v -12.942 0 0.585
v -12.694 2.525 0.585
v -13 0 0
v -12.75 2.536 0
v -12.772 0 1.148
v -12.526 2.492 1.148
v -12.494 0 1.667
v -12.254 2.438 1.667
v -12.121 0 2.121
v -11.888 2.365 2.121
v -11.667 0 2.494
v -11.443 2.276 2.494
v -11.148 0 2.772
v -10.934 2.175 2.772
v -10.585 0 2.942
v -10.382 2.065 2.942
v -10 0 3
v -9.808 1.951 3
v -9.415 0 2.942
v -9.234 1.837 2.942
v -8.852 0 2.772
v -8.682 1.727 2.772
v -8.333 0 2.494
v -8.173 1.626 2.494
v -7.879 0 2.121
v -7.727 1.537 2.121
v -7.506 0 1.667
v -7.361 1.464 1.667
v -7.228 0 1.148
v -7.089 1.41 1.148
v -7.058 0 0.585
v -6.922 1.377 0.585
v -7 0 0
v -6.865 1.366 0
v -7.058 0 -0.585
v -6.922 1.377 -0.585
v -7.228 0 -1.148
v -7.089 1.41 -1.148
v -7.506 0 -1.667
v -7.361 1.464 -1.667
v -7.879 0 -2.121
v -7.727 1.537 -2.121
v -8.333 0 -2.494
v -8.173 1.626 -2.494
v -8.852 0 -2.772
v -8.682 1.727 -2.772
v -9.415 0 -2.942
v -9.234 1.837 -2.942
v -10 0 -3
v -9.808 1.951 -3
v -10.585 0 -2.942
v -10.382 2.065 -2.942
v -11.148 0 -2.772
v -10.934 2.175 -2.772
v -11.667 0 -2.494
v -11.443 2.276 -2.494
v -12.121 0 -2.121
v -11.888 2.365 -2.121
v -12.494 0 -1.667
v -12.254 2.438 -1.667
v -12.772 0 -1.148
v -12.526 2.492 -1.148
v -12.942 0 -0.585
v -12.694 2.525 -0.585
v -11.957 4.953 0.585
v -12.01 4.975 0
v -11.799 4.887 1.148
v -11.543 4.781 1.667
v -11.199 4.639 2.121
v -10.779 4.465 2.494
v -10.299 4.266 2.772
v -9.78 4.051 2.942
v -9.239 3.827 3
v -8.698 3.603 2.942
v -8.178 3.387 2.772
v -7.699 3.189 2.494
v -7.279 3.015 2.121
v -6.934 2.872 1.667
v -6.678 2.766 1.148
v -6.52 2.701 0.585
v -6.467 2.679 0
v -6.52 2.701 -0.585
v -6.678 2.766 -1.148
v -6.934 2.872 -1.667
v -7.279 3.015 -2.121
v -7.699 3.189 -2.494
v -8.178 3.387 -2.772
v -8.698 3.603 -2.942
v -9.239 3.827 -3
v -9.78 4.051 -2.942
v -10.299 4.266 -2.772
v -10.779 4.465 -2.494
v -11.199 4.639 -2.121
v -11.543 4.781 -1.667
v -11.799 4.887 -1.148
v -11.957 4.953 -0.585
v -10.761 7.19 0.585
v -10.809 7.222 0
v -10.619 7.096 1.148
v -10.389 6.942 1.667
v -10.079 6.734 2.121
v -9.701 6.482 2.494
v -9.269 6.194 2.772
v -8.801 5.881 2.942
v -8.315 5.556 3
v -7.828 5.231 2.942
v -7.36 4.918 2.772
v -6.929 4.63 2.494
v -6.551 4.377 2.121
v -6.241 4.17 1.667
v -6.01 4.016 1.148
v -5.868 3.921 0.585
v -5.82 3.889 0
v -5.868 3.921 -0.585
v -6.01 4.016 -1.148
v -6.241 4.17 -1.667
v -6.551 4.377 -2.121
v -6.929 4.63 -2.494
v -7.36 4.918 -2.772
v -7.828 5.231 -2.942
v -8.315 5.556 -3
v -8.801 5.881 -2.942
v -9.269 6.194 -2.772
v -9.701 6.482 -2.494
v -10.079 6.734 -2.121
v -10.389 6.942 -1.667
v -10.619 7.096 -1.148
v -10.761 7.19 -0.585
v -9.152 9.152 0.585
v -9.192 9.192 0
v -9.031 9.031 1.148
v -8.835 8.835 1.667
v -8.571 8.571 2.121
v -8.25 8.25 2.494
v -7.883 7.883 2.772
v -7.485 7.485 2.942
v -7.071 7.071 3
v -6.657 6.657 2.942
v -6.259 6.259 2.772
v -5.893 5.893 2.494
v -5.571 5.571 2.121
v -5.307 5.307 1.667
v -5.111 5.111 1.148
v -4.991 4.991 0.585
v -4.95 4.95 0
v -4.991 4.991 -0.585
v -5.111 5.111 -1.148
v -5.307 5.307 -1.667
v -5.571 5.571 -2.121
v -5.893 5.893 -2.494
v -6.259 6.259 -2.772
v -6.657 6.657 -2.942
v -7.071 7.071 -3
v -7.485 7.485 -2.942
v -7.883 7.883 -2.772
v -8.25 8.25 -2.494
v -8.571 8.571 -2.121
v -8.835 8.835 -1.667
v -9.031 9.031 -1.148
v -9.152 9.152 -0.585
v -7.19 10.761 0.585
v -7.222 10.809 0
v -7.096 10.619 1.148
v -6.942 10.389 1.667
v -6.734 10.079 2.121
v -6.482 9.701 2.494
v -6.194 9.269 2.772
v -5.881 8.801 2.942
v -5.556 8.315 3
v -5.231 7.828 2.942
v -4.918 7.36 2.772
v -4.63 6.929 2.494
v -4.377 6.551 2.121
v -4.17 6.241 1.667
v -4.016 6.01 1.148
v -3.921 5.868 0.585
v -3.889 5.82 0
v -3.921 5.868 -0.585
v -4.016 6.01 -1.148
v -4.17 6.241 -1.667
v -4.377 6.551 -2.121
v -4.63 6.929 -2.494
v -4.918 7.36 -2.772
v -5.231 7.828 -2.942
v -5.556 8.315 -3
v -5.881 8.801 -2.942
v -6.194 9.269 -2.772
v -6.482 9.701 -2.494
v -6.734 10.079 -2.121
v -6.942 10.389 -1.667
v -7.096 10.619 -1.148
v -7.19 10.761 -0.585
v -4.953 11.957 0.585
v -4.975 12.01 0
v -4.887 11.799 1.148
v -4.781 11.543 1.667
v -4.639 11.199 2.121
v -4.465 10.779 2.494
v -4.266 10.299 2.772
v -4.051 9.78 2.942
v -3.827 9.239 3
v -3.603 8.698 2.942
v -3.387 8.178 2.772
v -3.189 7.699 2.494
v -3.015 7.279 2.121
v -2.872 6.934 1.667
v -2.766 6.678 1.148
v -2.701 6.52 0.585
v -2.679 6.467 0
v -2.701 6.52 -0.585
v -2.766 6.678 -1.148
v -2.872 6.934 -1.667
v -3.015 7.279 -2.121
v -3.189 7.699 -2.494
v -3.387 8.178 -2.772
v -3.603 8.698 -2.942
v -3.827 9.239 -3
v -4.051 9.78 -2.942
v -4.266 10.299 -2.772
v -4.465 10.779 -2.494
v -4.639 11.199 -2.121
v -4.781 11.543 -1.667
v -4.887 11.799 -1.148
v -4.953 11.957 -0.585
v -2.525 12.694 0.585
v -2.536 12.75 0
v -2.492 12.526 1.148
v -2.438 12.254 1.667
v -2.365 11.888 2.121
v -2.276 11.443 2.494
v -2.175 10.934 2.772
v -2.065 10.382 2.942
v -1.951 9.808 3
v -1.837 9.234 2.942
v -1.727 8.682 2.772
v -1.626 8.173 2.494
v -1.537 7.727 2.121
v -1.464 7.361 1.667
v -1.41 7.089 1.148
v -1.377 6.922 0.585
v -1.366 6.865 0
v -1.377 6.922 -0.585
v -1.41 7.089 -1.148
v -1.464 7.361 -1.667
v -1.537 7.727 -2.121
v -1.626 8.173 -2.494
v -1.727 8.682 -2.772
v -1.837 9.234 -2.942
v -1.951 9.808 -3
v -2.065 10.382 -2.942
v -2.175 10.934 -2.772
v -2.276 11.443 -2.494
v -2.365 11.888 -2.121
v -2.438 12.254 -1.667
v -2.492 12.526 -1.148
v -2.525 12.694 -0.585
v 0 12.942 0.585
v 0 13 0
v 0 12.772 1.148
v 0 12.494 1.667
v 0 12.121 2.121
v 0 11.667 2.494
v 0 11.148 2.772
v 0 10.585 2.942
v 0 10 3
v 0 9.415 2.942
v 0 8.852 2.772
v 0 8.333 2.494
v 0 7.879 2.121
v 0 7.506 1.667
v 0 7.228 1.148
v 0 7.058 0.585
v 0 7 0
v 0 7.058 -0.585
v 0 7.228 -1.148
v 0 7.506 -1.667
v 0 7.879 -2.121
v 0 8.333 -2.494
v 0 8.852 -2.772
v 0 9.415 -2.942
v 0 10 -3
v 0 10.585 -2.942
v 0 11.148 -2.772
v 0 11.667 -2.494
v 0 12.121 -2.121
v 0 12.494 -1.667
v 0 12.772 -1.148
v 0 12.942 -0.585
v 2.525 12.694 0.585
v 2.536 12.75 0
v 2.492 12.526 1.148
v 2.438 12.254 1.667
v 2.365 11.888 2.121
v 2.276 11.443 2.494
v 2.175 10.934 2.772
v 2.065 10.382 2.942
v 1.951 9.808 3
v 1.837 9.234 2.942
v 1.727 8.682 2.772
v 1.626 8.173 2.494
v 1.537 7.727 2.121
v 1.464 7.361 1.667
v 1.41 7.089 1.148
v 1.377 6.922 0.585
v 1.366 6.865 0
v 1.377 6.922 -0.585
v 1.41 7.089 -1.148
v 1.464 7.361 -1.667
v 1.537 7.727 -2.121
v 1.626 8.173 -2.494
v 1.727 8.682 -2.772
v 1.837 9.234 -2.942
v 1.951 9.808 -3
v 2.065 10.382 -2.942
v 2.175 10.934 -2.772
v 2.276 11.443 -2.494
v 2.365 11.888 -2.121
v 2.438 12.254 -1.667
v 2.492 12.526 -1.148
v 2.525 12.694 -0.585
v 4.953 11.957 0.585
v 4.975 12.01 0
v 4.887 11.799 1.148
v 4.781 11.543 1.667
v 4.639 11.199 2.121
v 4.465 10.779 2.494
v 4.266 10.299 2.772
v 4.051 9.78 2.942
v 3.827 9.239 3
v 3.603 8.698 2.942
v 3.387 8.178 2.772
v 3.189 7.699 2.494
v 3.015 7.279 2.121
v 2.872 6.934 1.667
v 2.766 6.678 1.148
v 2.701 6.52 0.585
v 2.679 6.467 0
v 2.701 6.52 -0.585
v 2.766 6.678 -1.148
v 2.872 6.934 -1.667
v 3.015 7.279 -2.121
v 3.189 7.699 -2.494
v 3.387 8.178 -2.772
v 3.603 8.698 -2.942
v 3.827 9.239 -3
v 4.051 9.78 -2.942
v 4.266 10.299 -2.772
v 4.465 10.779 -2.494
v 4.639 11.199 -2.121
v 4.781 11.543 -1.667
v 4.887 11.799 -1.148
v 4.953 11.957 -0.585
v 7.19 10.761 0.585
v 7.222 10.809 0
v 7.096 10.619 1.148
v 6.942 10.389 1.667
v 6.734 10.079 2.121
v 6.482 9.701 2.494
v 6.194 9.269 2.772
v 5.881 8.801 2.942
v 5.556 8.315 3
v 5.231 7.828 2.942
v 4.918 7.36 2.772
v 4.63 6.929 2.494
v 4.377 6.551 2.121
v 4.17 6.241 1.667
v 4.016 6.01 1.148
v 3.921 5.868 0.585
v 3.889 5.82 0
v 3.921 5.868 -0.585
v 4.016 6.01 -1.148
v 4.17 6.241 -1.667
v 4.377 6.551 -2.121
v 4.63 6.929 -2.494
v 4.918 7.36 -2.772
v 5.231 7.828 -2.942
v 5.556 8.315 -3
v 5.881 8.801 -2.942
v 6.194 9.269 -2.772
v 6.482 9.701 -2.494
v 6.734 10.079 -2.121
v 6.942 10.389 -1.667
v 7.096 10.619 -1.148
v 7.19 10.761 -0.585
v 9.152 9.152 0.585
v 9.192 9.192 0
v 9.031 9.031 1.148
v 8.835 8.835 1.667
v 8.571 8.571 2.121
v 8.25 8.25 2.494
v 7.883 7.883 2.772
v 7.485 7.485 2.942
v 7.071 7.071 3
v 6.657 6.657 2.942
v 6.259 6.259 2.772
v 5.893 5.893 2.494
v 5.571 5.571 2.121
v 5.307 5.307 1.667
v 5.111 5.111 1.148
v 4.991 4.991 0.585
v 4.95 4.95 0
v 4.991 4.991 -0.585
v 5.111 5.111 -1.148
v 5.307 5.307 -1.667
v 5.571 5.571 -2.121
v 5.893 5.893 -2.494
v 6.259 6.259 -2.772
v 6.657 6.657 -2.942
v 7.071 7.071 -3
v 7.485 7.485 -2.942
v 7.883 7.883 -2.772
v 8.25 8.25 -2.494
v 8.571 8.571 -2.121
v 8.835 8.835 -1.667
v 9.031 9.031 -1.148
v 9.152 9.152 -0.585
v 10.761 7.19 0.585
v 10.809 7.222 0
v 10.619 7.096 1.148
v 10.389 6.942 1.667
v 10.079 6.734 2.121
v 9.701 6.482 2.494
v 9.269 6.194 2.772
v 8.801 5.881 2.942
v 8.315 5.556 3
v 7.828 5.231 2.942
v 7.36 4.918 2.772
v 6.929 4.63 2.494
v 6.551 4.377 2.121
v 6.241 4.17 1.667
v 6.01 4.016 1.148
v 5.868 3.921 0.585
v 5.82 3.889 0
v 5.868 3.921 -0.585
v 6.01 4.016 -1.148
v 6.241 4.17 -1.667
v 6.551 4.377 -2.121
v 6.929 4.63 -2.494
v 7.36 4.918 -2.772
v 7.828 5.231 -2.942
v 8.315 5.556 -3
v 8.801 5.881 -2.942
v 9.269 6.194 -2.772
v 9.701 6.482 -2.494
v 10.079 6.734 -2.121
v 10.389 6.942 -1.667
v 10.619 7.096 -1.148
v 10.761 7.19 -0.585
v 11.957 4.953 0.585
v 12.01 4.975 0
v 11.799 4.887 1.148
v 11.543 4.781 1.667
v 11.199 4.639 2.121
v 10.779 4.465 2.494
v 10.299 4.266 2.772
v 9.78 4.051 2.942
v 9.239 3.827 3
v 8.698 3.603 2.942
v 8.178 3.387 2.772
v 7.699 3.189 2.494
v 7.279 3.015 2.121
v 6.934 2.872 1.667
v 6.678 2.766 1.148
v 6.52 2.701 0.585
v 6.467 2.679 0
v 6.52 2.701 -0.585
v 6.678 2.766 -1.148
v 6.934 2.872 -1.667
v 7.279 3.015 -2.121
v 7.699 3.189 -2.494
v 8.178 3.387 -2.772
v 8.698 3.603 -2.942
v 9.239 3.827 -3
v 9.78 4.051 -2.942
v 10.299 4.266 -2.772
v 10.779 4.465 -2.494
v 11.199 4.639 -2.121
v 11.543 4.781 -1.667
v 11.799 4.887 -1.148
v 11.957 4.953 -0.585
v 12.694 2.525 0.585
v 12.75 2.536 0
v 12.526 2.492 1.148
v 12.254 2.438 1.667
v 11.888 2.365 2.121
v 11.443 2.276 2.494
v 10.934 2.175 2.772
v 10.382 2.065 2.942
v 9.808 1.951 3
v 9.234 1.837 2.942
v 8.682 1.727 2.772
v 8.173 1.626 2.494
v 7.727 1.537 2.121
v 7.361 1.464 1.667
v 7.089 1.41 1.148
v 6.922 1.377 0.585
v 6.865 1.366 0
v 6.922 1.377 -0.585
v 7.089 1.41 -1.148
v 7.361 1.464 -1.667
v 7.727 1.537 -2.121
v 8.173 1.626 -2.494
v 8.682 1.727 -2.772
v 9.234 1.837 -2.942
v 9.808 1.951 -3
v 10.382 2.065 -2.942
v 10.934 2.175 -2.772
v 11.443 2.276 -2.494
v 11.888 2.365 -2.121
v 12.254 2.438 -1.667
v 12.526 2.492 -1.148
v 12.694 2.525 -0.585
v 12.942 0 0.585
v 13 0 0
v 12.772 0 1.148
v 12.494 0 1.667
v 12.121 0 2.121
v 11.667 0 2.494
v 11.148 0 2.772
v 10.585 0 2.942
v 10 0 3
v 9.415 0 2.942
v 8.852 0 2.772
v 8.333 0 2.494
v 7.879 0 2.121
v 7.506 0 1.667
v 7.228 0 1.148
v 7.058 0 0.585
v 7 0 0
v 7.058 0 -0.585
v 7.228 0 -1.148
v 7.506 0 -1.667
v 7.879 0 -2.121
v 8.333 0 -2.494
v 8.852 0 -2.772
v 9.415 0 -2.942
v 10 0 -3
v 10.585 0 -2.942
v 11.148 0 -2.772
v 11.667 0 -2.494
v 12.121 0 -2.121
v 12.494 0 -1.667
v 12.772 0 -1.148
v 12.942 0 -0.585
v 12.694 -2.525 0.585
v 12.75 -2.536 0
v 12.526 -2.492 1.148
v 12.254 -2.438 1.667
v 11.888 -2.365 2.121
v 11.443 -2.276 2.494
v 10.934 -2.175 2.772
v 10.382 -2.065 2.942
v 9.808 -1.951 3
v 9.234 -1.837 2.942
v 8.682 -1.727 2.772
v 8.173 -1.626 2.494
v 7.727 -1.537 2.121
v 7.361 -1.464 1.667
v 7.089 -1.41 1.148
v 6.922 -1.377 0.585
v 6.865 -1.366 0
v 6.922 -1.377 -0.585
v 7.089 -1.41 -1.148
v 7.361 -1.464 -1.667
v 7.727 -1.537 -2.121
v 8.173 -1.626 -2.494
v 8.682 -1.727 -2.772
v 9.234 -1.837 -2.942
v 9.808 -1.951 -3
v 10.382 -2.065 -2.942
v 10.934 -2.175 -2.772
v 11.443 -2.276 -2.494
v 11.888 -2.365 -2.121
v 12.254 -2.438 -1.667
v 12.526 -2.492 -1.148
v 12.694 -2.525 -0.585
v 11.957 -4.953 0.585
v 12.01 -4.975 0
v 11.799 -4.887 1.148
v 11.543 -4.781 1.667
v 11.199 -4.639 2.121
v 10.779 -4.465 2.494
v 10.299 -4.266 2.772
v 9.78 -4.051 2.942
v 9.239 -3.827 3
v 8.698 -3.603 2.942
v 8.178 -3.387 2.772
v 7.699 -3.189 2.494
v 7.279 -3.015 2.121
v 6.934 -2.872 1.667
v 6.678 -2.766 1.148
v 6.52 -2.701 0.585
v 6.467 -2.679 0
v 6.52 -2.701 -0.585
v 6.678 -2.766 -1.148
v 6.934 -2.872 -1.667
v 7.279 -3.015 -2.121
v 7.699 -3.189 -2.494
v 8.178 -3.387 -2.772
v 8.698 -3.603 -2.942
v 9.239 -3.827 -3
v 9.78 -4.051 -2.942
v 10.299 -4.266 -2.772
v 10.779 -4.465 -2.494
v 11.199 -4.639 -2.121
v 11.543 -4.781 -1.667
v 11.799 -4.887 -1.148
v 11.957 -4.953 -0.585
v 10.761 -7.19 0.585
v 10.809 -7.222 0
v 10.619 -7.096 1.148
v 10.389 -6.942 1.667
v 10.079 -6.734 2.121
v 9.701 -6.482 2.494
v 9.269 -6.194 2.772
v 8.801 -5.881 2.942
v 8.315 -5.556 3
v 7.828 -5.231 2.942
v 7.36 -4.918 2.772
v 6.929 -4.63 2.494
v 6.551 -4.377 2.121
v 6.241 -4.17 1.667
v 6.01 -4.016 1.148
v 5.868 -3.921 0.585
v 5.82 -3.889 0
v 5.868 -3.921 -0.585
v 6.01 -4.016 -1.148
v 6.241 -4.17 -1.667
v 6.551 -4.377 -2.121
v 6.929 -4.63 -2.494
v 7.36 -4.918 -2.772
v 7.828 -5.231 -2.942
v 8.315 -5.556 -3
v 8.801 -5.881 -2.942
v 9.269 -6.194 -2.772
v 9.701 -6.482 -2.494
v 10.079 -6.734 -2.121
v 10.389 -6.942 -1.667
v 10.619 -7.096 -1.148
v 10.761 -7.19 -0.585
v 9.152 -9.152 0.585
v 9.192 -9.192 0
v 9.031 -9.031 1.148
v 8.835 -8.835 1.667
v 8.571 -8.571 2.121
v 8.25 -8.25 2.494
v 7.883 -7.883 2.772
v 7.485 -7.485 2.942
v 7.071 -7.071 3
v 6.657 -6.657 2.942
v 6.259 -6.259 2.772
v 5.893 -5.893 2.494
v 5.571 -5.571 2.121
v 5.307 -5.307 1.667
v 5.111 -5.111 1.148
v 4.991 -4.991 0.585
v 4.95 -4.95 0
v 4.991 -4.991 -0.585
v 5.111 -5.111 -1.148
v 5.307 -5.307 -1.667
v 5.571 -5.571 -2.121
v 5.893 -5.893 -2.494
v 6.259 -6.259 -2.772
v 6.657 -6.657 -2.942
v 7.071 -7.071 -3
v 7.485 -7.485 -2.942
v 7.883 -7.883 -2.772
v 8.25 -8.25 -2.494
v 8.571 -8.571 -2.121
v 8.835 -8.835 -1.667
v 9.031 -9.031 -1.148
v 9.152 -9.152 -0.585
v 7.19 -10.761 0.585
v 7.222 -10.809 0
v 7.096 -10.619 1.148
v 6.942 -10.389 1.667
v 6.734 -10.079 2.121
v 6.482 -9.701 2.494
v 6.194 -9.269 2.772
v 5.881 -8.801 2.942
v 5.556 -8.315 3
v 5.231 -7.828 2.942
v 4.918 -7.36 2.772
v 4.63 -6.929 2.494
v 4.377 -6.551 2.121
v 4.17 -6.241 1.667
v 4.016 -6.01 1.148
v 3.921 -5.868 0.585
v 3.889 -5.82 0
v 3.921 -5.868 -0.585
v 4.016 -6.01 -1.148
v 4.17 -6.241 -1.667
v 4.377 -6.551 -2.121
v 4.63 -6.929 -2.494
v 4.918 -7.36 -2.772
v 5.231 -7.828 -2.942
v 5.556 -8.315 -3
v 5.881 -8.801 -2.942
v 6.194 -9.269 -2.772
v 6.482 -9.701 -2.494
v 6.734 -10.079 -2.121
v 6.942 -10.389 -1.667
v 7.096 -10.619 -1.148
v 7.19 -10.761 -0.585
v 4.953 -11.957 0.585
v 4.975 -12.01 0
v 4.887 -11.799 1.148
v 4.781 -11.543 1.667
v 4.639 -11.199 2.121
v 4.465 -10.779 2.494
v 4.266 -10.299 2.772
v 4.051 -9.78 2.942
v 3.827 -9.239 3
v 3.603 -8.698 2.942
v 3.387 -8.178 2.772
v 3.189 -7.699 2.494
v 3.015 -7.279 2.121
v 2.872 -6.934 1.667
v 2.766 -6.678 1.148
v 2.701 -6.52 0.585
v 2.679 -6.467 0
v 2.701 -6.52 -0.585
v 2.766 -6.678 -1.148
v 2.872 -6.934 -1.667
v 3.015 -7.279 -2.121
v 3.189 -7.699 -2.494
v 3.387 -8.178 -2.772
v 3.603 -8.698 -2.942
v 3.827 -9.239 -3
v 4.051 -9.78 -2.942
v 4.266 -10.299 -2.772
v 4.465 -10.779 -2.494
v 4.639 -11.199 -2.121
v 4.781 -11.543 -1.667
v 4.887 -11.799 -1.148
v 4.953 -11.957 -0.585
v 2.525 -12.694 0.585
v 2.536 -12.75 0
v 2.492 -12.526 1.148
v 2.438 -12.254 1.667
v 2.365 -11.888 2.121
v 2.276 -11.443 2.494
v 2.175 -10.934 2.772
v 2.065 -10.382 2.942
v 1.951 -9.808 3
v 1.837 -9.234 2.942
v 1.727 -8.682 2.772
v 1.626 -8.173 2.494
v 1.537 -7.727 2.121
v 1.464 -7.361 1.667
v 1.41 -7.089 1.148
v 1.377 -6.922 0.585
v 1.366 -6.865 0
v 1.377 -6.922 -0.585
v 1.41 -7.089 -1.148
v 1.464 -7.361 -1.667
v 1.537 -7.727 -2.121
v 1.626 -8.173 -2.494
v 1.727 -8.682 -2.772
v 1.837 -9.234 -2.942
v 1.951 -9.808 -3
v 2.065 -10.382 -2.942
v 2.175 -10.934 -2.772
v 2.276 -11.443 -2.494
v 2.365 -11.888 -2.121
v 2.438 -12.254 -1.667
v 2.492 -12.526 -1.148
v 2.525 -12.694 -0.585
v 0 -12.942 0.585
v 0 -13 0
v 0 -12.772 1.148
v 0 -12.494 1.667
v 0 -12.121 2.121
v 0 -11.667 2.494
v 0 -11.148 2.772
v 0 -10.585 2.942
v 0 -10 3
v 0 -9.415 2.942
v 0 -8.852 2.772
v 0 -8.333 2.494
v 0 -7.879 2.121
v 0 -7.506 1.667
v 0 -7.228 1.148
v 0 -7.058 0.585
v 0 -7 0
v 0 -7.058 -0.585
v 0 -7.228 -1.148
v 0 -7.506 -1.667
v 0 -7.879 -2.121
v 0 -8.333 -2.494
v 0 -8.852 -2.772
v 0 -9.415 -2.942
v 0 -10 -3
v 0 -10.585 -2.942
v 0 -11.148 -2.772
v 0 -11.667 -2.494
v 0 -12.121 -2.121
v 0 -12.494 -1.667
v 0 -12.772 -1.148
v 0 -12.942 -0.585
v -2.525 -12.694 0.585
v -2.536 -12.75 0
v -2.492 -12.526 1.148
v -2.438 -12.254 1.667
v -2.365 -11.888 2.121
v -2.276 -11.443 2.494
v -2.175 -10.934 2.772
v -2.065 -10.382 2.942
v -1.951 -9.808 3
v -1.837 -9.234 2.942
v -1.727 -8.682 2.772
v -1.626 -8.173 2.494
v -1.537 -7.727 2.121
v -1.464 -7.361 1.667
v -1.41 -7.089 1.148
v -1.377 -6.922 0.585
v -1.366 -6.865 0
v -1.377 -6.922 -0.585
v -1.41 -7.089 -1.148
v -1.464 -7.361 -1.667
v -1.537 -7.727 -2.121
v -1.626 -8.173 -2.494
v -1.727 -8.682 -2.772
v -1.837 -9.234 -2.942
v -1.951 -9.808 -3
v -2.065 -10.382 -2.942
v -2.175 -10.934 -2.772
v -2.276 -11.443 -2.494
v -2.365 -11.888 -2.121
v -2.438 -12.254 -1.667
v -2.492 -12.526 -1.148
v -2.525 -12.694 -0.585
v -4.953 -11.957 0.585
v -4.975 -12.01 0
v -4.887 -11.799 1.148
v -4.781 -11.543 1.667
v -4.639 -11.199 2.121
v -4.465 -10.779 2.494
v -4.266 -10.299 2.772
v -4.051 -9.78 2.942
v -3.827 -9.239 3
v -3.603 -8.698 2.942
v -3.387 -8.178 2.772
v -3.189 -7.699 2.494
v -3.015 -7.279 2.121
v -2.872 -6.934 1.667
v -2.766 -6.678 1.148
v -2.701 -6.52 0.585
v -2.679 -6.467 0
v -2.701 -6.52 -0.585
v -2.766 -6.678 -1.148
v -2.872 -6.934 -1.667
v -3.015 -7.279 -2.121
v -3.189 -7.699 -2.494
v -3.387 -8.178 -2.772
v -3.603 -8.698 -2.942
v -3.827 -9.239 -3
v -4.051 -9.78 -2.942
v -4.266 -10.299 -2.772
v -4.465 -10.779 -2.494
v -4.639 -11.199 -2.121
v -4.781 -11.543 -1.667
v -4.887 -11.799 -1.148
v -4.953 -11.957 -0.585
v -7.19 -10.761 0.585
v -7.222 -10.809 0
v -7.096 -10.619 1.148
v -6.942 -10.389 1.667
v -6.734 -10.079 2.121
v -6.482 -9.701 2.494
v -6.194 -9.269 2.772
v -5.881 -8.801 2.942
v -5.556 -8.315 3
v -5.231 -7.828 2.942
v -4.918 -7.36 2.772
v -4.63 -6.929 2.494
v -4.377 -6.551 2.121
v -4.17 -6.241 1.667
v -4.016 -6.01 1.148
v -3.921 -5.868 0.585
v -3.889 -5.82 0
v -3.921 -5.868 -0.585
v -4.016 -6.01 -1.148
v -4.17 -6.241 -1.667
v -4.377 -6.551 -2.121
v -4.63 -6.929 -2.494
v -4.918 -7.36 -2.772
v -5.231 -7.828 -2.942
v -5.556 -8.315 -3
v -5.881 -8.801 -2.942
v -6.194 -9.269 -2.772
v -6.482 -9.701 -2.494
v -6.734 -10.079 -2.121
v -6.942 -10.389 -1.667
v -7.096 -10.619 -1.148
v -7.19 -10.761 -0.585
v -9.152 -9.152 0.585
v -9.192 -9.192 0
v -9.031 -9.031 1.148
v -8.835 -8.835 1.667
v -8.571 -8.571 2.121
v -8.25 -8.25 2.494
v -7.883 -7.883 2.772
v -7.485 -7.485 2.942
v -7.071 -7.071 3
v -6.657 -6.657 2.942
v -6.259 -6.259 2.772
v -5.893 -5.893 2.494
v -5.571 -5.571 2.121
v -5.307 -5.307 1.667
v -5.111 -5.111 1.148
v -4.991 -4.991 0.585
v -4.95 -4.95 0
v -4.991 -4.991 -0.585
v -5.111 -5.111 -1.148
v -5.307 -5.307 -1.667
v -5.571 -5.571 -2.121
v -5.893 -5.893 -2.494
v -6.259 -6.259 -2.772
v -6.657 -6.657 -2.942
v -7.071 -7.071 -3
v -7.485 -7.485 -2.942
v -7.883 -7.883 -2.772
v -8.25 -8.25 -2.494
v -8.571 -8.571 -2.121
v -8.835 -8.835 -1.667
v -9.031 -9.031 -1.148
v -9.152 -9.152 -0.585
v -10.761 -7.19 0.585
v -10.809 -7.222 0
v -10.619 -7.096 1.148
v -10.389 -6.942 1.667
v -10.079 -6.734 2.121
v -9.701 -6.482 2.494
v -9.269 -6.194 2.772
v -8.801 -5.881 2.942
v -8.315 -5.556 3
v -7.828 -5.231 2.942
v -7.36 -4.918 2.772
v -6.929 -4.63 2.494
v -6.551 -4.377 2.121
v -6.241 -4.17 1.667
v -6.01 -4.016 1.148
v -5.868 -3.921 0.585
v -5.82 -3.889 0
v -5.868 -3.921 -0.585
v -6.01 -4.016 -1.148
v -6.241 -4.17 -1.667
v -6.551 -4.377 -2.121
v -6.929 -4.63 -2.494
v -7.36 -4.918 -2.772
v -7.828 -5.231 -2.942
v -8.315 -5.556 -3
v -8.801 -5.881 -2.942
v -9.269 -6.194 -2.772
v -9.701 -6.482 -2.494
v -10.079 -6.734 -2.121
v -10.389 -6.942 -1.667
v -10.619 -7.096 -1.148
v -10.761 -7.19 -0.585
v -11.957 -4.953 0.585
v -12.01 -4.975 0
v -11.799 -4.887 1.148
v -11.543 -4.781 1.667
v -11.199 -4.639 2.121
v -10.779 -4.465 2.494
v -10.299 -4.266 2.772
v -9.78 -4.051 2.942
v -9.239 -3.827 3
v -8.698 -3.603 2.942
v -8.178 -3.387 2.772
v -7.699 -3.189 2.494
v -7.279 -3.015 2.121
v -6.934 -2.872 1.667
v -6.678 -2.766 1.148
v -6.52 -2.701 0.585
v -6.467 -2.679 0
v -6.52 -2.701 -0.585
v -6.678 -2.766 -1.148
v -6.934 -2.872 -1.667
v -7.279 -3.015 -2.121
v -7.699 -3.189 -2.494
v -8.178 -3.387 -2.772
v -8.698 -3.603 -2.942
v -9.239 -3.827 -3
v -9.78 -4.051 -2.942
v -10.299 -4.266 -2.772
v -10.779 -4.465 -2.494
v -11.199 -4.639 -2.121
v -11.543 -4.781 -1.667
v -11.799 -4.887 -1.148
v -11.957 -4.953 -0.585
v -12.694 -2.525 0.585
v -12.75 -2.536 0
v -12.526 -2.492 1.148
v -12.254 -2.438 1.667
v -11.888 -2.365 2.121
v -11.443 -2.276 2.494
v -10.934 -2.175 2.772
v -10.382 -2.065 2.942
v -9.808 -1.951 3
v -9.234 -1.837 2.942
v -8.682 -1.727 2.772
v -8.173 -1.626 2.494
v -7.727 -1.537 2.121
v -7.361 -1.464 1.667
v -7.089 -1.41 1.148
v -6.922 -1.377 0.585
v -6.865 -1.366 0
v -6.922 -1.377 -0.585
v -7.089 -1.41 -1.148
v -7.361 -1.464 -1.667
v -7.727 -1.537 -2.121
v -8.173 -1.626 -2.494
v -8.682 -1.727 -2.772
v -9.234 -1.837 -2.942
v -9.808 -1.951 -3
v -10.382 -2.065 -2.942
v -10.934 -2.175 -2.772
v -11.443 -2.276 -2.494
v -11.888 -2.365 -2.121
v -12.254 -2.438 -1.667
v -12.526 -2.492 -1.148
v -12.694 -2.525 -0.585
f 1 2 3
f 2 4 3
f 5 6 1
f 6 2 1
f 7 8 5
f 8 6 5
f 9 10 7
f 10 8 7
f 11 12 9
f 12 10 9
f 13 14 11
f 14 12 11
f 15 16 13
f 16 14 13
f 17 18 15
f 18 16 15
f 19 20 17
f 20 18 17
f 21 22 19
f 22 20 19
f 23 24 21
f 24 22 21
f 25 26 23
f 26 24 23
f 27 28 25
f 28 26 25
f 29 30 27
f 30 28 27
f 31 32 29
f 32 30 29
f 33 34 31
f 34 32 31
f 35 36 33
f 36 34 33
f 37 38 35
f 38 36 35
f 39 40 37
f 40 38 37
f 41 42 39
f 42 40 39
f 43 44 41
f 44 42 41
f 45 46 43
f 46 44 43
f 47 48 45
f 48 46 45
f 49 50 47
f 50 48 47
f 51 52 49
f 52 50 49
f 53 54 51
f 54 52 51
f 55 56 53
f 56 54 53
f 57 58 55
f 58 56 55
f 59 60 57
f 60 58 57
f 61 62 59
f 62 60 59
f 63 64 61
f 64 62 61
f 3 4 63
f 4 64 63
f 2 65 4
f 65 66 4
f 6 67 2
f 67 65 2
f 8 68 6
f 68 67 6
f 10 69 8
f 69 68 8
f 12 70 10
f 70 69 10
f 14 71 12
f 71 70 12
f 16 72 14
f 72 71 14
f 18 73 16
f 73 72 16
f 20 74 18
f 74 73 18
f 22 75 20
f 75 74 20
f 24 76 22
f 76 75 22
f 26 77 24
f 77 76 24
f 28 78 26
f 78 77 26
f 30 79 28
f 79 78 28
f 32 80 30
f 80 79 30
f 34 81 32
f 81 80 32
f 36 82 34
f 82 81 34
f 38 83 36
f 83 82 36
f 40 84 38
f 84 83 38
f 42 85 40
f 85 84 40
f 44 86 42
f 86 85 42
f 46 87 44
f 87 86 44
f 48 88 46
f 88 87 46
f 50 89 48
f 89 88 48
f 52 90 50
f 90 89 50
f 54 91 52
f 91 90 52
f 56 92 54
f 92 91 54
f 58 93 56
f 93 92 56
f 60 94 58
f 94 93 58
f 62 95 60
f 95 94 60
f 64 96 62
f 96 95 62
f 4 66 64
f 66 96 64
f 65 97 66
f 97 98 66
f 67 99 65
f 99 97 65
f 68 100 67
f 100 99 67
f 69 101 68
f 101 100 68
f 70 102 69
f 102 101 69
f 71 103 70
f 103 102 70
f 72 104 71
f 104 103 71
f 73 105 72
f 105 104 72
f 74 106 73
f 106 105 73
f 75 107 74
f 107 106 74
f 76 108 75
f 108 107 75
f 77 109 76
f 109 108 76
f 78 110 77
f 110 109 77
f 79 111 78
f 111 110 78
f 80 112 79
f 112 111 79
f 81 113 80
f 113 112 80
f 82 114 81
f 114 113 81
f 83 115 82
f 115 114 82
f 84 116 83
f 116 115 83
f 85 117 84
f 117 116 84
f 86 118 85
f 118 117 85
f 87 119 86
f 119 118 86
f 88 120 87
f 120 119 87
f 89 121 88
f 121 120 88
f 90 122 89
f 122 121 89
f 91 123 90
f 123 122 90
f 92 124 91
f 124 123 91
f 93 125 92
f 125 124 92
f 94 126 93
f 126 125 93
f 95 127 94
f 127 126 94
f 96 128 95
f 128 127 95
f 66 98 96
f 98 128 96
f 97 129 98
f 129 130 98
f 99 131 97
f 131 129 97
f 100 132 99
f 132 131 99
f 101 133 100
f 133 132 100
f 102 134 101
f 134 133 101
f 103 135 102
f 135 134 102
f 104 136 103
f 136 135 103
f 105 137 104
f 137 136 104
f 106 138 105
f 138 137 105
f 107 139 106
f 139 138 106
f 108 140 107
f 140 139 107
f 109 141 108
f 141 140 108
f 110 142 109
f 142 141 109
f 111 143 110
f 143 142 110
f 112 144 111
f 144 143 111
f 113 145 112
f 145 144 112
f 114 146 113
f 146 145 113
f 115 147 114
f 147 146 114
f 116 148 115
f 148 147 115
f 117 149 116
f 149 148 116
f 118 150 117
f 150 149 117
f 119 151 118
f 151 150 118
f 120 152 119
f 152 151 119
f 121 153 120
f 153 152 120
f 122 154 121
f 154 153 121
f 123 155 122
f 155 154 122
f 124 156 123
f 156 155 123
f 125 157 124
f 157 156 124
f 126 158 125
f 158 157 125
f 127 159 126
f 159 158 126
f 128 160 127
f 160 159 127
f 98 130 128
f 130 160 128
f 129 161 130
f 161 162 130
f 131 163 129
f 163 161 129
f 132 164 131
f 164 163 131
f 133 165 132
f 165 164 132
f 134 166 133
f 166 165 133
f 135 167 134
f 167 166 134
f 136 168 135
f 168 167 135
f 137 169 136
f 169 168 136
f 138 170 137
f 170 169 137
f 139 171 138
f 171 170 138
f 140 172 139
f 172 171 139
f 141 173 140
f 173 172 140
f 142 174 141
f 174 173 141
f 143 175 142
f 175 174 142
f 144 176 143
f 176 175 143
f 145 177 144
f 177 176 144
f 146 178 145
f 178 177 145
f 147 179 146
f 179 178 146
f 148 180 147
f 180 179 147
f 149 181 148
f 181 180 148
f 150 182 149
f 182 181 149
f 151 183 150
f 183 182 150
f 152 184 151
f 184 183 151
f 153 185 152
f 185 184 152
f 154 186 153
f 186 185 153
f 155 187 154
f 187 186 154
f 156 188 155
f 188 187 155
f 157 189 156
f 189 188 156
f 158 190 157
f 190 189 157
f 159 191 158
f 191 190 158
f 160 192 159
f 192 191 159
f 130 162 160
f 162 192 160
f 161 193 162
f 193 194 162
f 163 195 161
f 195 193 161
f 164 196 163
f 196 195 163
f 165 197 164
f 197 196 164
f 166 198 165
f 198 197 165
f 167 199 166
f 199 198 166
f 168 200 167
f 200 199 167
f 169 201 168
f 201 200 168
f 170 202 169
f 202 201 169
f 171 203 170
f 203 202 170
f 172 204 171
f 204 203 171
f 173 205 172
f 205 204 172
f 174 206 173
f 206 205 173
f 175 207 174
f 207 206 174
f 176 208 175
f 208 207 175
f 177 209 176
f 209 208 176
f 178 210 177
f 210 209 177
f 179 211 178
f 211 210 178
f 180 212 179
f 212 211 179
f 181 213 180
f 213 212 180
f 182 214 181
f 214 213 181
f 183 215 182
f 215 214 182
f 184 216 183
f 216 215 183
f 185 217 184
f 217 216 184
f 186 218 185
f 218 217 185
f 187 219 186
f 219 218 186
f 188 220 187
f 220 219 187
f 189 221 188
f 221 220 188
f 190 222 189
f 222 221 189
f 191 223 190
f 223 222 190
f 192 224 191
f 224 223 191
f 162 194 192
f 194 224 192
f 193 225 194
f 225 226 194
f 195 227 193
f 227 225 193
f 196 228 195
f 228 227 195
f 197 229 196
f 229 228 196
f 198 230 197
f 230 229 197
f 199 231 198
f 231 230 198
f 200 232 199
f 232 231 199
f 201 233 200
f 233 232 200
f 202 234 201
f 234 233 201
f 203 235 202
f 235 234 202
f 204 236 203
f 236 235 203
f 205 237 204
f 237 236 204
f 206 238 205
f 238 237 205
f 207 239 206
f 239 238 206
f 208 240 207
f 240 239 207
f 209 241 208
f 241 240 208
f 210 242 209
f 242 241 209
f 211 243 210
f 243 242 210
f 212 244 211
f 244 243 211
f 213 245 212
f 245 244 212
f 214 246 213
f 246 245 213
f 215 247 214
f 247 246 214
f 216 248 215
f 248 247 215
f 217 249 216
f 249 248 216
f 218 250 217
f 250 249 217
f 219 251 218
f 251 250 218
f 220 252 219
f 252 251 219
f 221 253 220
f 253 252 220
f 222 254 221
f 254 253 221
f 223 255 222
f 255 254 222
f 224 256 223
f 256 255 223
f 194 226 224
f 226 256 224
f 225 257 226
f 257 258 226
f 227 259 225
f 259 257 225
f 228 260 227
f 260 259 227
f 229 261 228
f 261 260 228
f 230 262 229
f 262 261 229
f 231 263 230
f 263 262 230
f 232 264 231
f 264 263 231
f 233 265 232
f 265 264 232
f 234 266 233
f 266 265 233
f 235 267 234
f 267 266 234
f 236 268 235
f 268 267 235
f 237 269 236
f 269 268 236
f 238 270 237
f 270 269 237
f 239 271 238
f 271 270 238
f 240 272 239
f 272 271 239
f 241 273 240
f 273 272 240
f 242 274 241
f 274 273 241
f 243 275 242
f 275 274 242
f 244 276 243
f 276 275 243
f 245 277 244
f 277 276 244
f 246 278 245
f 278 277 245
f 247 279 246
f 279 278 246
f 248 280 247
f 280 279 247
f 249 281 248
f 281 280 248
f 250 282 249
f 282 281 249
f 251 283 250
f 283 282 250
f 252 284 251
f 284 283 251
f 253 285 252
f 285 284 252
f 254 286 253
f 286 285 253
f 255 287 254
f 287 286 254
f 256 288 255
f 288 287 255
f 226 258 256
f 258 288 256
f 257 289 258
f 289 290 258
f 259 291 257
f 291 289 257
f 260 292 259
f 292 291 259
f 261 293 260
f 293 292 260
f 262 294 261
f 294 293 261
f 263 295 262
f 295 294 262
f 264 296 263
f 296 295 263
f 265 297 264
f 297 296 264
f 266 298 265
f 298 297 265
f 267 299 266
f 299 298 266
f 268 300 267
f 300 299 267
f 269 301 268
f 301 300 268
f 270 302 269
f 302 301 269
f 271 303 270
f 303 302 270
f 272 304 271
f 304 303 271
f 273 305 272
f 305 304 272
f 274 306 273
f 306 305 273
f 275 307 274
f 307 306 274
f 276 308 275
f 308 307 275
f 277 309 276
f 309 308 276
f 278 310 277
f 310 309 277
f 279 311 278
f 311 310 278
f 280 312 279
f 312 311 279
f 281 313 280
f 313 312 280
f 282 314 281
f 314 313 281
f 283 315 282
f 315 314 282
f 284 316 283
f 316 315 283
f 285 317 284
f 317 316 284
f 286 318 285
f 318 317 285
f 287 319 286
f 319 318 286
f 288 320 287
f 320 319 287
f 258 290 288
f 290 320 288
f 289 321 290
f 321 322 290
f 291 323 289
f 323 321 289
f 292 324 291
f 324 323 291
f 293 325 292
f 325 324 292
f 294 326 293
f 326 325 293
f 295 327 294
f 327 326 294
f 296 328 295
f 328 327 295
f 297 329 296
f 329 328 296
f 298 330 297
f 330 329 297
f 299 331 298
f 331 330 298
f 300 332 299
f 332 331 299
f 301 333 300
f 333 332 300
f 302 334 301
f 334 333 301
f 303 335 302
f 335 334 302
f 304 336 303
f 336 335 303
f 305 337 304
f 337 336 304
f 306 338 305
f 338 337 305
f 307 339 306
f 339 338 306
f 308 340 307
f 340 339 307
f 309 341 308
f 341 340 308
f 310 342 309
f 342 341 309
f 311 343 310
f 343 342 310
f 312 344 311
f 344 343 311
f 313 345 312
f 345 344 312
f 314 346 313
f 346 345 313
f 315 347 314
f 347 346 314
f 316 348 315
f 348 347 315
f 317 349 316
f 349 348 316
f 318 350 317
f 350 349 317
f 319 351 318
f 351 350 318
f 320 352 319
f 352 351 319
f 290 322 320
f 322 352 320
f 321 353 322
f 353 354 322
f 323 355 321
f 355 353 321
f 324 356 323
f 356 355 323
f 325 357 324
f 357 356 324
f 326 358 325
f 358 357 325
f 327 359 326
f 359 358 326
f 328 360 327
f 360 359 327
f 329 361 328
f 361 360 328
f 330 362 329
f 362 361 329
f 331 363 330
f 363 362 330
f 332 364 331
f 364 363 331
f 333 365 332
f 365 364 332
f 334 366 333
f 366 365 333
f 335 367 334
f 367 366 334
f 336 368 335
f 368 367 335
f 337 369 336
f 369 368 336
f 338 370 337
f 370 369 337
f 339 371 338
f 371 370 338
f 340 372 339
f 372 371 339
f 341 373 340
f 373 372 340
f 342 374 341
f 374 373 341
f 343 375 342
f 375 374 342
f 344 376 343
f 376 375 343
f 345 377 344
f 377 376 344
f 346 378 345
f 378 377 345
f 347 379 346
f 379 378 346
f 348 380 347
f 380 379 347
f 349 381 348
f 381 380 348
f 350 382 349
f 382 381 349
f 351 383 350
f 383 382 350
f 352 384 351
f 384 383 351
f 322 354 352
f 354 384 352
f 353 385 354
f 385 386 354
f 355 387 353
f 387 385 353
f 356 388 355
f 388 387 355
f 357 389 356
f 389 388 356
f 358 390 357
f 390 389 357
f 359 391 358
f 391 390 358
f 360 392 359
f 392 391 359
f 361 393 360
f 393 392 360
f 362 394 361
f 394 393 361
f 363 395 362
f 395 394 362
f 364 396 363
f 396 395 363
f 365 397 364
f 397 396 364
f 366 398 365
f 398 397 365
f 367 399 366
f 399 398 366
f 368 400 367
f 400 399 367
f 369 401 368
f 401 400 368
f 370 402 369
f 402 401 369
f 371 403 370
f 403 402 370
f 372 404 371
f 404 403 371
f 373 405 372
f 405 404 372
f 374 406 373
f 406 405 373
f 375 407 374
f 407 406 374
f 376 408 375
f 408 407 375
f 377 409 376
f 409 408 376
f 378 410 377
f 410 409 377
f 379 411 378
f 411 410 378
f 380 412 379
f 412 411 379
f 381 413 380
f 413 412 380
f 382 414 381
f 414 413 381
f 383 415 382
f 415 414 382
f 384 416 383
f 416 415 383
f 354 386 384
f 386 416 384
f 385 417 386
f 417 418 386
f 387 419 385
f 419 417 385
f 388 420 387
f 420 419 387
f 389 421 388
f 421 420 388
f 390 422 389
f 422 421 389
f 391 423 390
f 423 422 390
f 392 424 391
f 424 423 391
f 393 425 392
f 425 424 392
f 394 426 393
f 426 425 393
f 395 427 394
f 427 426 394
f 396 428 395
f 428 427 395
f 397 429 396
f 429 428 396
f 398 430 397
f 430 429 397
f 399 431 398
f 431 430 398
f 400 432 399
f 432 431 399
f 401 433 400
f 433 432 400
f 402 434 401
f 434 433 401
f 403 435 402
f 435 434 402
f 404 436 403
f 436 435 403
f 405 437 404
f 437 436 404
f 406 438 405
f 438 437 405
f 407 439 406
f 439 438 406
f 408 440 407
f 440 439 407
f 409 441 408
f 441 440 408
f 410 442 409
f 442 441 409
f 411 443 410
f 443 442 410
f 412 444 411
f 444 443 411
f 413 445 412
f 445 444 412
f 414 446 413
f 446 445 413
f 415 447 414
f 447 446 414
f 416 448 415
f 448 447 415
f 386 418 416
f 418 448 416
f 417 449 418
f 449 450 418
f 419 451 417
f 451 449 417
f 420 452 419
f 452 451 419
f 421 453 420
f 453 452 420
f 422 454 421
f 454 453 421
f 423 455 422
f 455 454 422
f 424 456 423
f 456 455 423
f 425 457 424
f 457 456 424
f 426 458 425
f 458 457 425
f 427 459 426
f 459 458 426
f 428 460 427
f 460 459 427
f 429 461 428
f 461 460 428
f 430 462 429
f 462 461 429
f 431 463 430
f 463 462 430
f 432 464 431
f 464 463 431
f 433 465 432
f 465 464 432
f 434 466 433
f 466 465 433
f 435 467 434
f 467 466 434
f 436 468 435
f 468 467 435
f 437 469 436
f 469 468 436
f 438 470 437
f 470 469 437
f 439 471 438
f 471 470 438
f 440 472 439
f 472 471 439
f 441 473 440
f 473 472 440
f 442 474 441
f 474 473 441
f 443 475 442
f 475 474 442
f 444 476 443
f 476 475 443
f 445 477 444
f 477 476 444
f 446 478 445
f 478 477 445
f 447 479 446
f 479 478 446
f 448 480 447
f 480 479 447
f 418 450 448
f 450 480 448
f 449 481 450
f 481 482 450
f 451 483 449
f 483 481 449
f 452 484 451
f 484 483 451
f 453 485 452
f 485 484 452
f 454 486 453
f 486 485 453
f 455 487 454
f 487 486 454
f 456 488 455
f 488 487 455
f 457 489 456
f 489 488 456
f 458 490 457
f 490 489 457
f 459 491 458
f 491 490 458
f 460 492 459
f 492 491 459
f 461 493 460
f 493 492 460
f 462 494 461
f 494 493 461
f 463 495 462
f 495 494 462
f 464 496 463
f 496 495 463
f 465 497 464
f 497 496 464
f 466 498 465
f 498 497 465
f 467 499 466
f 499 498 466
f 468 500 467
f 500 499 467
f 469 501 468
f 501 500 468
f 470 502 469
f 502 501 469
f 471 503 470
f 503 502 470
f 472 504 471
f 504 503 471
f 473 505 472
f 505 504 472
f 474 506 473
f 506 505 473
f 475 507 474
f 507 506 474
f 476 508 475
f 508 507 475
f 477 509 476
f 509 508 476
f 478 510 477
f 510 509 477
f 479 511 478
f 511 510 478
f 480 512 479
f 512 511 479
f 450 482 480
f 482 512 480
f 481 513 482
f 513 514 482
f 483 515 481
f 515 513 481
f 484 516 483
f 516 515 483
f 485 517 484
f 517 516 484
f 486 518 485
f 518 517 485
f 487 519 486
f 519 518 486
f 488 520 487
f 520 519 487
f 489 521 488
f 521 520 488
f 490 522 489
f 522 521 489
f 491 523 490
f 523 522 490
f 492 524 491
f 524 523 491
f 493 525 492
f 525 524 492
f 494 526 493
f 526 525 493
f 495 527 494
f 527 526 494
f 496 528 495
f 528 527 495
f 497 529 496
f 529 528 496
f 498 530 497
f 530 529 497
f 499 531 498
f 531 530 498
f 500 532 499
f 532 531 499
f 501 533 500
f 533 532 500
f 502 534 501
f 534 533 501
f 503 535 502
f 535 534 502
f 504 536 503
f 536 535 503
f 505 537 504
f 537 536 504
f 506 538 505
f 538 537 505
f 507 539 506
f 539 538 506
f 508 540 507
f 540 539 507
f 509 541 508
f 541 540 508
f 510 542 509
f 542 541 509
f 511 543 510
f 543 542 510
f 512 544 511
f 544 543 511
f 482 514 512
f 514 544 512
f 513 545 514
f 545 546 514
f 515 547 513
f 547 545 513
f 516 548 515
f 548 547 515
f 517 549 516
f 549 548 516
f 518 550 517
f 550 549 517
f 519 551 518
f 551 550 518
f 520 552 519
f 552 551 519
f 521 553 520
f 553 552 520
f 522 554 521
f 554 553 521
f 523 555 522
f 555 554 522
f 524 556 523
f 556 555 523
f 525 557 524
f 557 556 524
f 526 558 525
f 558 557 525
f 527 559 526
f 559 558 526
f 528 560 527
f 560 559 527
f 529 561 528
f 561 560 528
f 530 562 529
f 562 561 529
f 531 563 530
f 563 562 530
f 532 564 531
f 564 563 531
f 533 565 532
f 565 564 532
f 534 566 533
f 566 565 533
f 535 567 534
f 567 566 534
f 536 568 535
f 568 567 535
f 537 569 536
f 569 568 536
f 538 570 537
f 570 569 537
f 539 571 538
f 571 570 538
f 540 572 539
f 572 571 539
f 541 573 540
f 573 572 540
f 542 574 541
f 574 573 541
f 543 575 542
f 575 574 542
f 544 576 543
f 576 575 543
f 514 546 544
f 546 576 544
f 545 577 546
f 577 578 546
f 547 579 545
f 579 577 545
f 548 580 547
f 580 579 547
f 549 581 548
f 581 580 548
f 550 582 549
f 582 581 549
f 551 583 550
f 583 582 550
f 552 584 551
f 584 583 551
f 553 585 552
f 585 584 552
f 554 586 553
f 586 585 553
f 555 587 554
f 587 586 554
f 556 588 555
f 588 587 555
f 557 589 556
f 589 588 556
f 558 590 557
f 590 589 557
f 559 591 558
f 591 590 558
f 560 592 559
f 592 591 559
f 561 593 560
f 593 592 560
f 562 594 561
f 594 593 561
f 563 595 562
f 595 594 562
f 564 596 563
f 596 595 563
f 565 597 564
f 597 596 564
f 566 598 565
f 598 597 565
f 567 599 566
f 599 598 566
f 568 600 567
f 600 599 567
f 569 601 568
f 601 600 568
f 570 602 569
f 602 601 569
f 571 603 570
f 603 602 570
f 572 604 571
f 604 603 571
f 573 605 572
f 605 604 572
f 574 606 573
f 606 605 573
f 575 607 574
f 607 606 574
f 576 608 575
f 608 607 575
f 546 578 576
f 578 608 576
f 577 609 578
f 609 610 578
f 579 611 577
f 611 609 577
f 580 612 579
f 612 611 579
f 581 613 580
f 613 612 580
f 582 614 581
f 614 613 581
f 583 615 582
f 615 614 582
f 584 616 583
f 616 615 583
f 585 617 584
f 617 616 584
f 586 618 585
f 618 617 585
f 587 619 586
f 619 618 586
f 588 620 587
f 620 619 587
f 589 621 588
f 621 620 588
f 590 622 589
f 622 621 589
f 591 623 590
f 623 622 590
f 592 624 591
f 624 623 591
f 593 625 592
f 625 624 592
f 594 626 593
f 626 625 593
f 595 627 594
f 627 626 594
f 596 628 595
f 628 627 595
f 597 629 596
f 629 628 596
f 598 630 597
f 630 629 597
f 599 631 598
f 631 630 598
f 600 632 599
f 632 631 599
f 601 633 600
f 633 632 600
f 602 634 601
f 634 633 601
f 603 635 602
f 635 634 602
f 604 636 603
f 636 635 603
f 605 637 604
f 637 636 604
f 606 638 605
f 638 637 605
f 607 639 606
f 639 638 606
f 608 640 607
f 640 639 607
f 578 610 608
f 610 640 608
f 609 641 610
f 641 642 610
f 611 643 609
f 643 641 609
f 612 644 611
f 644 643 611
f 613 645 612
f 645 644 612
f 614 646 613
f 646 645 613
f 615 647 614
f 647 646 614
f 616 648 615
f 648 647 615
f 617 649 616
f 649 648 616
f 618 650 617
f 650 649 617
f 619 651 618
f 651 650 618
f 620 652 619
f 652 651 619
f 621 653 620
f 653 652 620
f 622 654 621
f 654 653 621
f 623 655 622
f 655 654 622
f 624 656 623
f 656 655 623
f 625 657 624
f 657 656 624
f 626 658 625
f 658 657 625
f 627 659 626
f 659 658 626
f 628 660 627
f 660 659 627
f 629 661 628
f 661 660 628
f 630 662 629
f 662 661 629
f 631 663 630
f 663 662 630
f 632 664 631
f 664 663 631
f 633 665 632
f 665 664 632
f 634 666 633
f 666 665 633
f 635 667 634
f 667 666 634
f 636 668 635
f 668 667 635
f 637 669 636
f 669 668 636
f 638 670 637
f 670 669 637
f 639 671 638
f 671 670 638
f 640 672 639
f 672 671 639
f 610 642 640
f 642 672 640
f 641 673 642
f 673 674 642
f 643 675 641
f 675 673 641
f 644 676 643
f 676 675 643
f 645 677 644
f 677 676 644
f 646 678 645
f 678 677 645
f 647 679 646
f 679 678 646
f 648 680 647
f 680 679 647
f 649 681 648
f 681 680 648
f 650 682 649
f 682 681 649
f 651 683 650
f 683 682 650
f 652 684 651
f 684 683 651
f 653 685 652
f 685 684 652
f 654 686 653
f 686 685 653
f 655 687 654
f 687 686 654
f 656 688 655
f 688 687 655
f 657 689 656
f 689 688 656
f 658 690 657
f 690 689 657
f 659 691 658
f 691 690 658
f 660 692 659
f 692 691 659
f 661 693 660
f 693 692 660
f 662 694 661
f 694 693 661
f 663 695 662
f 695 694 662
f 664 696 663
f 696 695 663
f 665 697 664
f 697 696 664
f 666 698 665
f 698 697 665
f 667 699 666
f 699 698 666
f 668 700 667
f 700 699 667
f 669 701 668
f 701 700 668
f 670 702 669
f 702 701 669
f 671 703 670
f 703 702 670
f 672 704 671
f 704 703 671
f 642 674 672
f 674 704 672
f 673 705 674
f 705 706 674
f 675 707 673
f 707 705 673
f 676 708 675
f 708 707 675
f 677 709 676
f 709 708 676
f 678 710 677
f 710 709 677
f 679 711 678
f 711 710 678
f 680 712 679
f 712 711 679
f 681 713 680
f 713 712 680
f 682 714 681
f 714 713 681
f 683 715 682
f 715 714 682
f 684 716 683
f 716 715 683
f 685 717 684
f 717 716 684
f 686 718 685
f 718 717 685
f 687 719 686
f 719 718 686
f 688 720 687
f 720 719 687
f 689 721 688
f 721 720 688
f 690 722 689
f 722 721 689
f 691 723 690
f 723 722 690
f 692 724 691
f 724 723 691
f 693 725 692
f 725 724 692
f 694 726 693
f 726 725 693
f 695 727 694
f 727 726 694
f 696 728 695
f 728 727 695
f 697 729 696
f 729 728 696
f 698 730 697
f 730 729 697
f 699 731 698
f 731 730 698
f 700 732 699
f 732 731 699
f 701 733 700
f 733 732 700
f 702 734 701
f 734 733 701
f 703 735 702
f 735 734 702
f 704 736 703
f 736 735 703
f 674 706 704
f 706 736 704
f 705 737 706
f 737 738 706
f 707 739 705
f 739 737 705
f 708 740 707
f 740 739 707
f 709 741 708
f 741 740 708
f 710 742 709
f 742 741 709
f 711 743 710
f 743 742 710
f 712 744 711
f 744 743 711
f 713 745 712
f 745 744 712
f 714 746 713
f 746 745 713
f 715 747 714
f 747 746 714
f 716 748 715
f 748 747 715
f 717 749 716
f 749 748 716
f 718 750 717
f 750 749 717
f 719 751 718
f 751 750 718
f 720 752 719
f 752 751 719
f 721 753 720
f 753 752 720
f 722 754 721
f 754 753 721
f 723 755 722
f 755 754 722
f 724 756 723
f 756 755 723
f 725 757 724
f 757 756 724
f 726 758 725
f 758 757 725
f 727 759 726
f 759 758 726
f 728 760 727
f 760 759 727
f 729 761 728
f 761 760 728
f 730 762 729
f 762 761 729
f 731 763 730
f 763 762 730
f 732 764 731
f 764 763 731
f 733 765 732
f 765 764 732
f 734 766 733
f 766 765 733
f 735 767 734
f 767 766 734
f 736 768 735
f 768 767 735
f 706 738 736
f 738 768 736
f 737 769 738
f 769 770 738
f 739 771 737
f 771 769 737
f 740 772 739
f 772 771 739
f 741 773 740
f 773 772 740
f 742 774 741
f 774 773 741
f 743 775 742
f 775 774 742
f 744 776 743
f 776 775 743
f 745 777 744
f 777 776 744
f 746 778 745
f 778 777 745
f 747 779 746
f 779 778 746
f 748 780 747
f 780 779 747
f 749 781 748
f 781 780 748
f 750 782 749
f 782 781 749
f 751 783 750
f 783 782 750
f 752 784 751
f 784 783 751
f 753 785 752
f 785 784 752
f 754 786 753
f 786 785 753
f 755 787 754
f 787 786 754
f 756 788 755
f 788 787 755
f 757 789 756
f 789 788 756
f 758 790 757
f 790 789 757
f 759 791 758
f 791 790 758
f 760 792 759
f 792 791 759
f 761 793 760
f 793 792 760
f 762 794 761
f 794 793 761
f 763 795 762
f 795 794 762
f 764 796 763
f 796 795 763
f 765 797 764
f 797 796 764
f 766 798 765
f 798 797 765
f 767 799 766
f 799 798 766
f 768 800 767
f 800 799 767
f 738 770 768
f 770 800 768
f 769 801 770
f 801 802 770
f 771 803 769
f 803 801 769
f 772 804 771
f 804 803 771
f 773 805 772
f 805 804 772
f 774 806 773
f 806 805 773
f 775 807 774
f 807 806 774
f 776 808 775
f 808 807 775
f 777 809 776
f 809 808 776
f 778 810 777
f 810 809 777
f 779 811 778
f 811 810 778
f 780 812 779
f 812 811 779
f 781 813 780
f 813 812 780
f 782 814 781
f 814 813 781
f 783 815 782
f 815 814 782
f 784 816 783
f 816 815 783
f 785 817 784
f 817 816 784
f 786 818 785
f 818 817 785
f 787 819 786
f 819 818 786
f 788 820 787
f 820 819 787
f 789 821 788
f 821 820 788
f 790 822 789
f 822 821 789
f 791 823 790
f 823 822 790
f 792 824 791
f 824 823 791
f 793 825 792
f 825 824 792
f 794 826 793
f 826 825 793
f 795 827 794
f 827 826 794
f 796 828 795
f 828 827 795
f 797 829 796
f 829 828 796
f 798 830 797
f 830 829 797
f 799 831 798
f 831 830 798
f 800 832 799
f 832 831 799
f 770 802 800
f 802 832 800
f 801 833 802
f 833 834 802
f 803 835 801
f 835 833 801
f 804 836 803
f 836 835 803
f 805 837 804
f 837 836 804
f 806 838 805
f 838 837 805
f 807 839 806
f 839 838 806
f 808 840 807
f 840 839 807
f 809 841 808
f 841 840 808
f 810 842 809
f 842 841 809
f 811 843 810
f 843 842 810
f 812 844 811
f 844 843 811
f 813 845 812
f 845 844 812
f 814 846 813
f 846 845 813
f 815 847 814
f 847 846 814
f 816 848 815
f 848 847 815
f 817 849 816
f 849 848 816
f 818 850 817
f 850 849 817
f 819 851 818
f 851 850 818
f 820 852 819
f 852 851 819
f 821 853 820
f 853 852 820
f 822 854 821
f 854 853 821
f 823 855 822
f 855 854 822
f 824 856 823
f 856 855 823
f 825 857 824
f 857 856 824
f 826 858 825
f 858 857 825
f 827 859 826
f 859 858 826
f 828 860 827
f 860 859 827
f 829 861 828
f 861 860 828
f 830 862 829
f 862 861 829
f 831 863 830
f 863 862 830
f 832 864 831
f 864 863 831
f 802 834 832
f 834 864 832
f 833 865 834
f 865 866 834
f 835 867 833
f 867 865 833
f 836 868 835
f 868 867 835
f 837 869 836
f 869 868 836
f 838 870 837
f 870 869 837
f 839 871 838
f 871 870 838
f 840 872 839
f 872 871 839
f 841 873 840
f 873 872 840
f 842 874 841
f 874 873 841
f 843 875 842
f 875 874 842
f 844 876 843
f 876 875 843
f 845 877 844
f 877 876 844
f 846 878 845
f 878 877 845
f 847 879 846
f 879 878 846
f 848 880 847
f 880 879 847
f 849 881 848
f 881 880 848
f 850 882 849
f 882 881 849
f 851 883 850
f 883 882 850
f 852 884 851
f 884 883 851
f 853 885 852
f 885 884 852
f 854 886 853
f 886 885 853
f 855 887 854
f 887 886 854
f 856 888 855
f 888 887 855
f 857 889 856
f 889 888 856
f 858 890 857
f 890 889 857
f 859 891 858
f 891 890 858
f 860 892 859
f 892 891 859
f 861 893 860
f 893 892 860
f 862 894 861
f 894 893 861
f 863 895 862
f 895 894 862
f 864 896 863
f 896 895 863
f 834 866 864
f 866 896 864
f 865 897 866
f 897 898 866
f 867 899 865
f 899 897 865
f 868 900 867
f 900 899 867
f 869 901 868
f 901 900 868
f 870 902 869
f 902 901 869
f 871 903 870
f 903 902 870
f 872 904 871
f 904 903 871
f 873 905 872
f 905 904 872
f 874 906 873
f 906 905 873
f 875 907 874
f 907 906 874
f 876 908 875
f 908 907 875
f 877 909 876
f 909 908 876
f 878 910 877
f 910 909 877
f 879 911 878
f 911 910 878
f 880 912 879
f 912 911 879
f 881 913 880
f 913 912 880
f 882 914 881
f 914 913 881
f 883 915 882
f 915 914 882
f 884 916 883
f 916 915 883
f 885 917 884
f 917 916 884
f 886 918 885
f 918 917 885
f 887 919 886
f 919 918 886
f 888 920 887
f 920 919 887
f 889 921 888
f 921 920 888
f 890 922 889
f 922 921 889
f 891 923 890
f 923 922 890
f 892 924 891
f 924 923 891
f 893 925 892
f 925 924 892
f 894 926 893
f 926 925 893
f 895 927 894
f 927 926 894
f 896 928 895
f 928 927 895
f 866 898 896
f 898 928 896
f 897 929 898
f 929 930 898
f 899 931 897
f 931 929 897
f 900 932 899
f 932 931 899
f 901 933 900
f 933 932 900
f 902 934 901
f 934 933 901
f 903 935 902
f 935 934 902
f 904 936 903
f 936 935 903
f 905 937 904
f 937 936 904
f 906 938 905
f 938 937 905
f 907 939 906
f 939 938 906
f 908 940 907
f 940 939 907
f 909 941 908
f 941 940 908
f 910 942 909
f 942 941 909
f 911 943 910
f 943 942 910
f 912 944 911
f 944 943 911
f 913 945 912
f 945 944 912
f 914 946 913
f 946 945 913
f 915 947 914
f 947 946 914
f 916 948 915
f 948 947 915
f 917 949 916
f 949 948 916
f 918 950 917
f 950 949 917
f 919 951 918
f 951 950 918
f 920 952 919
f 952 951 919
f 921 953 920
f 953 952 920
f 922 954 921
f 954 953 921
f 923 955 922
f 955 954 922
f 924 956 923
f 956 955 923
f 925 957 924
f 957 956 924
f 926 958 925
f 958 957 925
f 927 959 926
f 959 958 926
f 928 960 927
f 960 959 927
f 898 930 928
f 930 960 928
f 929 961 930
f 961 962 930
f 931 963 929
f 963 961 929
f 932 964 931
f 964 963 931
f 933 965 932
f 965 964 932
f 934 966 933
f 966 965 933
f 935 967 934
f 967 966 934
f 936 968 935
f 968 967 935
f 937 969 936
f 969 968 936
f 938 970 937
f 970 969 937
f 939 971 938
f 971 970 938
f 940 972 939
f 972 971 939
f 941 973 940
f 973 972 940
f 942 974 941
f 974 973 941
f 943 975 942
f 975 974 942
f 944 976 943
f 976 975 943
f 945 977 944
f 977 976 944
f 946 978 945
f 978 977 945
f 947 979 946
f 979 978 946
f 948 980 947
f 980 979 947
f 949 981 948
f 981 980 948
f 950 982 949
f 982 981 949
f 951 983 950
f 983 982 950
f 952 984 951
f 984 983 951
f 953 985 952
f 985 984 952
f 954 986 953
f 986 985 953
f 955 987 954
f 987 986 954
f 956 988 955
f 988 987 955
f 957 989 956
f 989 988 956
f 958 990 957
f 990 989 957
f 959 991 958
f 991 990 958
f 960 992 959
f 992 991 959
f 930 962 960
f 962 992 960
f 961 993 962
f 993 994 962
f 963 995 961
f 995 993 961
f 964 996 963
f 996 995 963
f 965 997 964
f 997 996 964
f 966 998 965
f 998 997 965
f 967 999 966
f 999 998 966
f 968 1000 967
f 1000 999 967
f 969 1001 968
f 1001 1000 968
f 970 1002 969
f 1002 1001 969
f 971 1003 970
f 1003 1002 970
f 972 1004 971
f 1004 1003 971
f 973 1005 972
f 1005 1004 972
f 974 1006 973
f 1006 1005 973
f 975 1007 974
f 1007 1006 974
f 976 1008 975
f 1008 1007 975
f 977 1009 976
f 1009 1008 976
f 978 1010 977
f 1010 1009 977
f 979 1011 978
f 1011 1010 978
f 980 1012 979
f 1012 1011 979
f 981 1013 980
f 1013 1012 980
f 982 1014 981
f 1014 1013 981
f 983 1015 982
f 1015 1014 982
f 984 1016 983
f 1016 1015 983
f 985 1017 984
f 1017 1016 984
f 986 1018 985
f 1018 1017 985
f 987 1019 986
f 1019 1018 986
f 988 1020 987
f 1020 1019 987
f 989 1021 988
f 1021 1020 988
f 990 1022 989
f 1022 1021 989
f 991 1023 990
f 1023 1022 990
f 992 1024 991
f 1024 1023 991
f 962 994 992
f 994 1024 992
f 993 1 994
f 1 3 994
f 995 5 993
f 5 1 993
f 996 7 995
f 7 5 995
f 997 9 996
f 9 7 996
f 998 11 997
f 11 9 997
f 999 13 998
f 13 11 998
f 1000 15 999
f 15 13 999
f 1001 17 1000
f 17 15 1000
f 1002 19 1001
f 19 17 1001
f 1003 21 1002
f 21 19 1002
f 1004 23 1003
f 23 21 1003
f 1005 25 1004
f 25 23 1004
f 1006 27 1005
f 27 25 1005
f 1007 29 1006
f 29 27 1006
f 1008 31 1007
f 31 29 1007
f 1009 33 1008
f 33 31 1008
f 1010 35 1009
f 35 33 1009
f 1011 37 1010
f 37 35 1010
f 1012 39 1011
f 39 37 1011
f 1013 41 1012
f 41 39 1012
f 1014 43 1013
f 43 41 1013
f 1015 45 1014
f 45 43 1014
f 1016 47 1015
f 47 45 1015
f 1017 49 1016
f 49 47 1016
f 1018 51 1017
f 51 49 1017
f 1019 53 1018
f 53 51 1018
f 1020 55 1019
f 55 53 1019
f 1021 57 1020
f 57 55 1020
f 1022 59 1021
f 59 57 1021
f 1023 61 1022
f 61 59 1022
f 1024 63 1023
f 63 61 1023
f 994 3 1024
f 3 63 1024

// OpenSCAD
// A torus, written as one TOROIDAL_SURFACE.
//
// rotate_extrude() meshes a circular profile as a grid: one ring per profile
// edge, and every quad of that grid has its four corners at two radii and two
// heights. That is exactly what a frustum band looks like, and since a straight
// profile edge declares the circle at each of its ends, every ring has both of
// its rims declared. So even with nothing else a torus collapses - into a stack
// of exact cones, each passing through the mesh vertices with zero residual and
// sharing its rim circle with the ring above and below. At $fn = 32 that alone
// is 1024 facets down to 32 faces.
//
// The stack is then merged into one surface, by the same pass that merges a
// sphere. The difference is only that this run has no ends: every rim is
// shared, so there is nothing to keep, and the face is bounded by its own two
// seams instead - the circle the tube's centre traces and the circle of the
// tube itself, each closed, each through the one vertex where they cross, each
// used once in either direction. That is the same four edge loop a periodic
// cylinder uses, so the doubly periodic case needs a second seam and not a new
// shape, which is what the roadmap expected it to need.
//
// It needs a declaration of its own. The ring circles say "cone" thirty-two
// times over and only a TorusSurface says the thirty-two were one surface -
// which rotate_extrude knows because the circle told it. The profile carries the
// circle as an Arc2d and the revolve turns it into the torus it sweeps, the same
// path a rounded corner takes in step-rounded-profile.scad.
//
// It used to be read off the node tree instead - walk down through the
// transforms and see whether the child is a CircleNode - because a 2D outline
// carried vertices, a winding flag and a colour and no record of having been
// round. That worked for a bare circle and stopped at the first difference() or
// rotation in the way. The channel does not.
//
// This is also the first thing to chain more than three closed bands through
// shared rims; the bayonet's longest chain is a wall on a chamfer on a wall.
//
// Expected: 18 analytic surfaces available - the profile's 32 radii, which
// repeat in pairs about the widest and narrowest points and so give 17, plus
// the torus - and 1 surface recognised, toroidal, none conical, none partial,
// 1024 facets replaced. One face, because a torus is closed and has no others.
//
// If the report says 32 conical, the torus was not declared and this is the
// cone stack again.
//
// Measured, and asserted by the driver: what the exporter has to report for
// the above to have happened. A silently faceted export is still a valid one,
// so validity alone cannot see a recogniser that has stopped recognising.
// EXPECT: 18 analytic surfaces available (17 cylindrical, 0 spherical, 1 toroidal, 0 Bezier)
// EXPECT: 1 surface recognised (1 toroidal, 0 spherical, 0 conical, 0 partial), 1024 facets replaced
//
// Pappus: 2*pi^2*R*r^2 = 2*pi^2*10*9 = 180*pi^2. Exact because both the
// revolution and the profile circle come back as one TOROIDAL_SURFACE.
// ROUNDTRIP: Torus=1
// VOLUME: 1776.5287922
//
// It raises no EXPORT-WARNING, and any would fail the test. It named one until
// 2026-10-05: the corner arbiter rebuilt the band's surface from its rims and
// asked the corners of the zone to lie on that, not on the surface the face
// is written on (open item 43, W1).
$fn = 32;
rotate_extrude()
  translate([10, 0]) circle(3);
